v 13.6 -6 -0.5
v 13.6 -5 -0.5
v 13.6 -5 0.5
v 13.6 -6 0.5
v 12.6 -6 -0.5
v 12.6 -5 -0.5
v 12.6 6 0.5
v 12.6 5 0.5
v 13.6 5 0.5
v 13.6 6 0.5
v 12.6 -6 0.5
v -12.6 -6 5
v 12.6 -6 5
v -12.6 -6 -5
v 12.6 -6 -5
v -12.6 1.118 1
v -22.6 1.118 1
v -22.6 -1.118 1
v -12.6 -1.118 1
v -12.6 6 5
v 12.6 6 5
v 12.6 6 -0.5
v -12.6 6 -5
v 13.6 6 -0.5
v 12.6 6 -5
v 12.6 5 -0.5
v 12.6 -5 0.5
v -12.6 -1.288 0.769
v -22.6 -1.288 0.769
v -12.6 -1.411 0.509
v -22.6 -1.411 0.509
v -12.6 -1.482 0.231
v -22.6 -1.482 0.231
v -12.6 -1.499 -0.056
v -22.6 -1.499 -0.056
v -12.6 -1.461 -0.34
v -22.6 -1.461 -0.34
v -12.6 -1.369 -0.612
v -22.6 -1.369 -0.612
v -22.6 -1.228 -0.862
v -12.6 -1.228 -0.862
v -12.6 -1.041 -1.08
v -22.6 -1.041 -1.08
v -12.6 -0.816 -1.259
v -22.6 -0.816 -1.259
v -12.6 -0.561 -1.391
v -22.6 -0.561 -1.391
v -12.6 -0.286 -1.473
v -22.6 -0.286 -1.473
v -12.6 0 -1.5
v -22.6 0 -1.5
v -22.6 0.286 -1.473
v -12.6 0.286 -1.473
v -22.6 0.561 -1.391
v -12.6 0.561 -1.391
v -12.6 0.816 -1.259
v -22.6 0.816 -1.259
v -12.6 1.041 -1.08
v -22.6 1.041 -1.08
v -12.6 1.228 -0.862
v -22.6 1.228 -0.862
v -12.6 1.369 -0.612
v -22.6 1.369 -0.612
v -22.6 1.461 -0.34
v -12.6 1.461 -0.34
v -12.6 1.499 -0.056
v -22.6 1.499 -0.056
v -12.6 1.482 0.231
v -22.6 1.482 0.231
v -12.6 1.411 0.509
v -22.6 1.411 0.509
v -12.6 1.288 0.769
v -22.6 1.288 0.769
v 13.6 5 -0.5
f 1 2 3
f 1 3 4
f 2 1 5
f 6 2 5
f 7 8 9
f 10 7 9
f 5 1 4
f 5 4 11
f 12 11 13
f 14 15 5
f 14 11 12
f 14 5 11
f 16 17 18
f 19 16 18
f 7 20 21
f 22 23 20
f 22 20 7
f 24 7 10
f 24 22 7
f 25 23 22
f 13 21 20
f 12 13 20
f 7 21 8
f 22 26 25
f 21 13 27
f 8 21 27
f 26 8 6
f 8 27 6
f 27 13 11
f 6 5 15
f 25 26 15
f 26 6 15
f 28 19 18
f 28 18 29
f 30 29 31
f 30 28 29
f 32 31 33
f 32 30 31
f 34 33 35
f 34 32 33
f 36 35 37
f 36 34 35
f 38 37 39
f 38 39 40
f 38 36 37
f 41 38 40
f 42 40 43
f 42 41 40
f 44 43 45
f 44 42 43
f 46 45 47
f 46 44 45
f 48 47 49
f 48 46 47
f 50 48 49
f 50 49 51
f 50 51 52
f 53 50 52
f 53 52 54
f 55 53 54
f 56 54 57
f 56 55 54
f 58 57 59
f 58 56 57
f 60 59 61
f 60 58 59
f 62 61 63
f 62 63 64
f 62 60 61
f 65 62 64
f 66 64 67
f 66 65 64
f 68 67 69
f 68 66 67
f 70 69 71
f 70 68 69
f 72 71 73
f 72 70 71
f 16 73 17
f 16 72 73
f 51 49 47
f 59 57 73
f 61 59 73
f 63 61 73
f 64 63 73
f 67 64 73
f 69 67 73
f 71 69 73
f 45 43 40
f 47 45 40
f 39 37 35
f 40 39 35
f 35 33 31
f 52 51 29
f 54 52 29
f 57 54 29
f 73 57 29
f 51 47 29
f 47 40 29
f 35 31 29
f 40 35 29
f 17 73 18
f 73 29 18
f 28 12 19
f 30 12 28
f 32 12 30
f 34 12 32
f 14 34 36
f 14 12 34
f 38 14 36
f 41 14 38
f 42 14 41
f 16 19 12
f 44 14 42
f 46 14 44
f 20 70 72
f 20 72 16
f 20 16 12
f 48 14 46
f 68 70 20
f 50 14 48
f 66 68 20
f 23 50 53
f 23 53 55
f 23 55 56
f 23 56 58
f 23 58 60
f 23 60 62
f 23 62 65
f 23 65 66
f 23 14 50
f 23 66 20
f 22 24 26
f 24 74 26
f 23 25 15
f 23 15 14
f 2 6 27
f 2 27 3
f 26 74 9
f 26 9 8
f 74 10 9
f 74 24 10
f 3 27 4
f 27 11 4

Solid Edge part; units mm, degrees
sketch "Sketch1" plane through (0, 0, 0) normal (0, 0, 1) x (1, 0, 0)
  line L0 (-12.6, 6) -> (13.6, 6)
  line L1 (13.6, 6) -> (13.6, 5)
  line L2 (13.6, 5) -> (12.6, 5)
  line L3 (12.6, 5) -> (12.6, -5)
  line L4 (12.6, -5) -> (13.6, -5)
  line L5 (13.6, -5) -> (13.6, -6)
  line L6 (13.6, -6) -> (12.6, -6)
  line L7 (12.6, -6) -> (-12.6, -6)
  line L8 (-12.6, -6) -> (-12.6, 6)
  dimension "D1" = 1
  dimension "D2" = 25.2
  dimension "D3" = 12
extrude "Protrusion1" add sketch "Sketch1" along normal mid plane 10
sketch "Sketch2" plane through (-12.6, 0, 0) normal (-1, 0, 0) x (0, -1, 0)
  line L0 (-1.118, 1) -> (1.118, 1)
  arc A0 (1.118, 1) -> (-1.118, 1) centre (0, 0) cw
extrude "Extrusionsausprägung_2" add sketch "Sketch2" along normal blind 10
sketch "Sketch3" plane through (0.5, -6, 0) normal (0, -1, 0) x (1, 0, 0)
  line L0 (12.1, 5) -> (12.1, 0.5)
  line L1 (12.1, 0.5) -> (14.7225, 0.5)
  line L2 (14.7225, 0.5) -> (14.7225, -0.5)
  line L3 (14.7225, -0.5) -> (12.1, -0.5)
  line L4 (12.1, -0.5) -> (12.1, -5)
  line L5 (12.1, -5) -> (16.9728, -5)
  line L6 (16.9728, -5) -> (16.9728, 5)
  line L7 (16.9728, 5) -> (12.1, 5)
  dimension "D1" = 1
  dimension "D2" = 1
extrude "Extrusionsausschnitt_1" cut sketch "Sketch3" against normal blind 24
